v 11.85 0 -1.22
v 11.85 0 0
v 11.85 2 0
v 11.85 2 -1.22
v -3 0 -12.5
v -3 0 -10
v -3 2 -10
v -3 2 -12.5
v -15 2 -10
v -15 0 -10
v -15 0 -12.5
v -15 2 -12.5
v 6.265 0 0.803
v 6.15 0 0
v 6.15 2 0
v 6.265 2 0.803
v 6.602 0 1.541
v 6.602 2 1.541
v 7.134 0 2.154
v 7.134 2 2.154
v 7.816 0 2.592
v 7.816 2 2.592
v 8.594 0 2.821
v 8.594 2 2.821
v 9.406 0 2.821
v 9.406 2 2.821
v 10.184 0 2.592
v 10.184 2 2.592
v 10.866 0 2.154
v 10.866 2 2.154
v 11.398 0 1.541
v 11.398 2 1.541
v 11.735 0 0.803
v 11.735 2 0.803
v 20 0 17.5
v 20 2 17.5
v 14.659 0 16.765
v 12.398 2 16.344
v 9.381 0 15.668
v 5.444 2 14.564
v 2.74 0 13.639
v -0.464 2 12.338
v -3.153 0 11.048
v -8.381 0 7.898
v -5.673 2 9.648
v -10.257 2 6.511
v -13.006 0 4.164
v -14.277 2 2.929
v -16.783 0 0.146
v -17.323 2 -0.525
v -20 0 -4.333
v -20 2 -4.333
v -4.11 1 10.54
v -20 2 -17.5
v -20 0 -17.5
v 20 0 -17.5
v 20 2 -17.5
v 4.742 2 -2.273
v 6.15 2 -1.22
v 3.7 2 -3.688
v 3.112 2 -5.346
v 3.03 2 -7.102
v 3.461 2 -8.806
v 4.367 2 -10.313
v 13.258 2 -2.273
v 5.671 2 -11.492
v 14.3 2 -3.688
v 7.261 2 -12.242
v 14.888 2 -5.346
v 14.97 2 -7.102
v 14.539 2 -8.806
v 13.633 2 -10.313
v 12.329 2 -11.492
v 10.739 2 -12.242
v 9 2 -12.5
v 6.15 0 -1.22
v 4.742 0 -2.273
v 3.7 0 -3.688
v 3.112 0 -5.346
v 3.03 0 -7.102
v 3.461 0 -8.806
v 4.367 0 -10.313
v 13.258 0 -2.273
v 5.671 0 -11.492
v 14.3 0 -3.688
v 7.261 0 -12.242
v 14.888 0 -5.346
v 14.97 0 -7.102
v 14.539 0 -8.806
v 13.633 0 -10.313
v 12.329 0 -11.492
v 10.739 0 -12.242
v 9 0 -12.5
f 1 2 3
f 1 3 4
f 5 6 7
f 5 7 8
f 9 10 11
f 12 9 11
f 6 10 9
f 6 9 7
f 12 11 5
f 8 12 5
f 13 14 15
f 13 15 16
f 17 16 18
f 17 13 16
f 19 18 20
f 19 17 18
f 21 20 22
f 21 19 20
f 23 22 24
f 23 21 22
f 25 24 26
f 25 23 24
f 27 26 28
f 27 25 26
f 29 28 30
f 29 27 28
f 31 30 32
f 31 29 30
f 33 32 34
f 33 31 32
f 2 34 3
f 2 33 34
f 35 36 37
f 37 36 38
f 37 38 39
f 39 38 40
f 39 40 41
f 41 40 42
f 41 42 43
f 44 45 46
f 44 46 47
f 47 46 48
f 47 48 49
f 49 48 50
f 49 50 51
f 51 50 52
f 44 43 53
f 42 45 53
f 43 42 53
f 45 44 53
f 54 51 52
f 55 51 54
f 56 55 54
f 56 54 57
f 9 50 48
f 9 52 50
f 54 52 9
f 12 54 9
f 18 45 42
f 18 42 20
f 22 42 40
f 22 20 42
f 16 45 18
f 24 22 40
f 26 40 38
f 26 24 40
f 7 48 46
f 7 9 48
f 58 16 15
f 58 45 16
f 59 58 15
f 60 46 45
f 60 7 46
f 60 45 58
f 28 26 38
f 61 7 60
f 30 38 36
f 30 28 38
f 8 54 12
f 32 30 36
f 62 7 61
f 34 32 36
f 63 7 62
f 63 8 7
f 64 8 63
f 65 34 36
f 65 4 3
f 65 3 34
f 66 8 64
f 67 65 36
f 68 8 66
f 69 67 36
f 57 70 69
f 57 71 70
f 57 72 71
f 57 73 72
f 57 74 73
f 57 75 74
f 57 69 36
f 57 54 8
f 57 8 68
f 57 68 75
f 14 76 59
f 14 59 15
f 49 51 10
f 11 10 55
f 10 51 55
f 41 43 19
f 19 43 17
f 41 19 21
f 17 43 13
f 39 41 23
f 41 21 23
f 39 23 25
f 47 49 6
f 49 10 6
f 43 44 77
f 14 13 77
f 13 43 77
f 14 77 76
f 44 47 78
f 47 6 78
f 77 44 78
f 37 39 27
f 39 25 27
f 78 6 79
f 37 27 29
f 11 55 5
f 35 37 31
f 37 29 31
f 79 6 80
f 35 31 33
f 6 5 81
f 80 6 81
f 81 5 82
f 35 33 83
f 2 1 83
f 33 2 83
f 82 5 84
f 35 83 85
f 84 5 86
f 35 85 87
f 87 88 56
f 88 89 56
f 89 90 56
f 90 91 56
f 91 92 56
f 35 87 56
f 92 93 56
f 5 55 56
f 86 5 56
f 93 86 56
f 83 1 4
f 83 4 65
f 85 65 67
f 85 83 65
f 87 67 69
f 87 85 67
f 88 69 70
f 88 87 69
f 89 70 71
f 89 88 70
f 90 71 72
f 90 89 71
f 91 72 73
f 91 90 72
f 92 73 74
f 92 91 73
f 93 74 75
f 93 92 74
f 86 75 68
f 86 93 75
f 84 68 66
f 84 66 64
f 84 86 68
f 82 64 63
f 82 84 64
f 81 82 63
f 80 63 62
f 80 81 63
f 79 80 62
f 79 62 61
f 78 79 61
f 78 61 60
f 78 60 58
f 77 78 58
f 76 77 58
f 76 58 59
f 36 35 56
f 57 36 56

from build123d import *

# Parameters (mm, degrees)
ESQUISSE1_W             = 40
ESQUISSE1_H             = 35
ESQUISSE1_W_2           = 12
ESQUISSE1_H_2           = 2.5
BOSS_EXTRU_1_DEPTH      = 2
ENL_V_MAT_EXTRU_1_DEPTH = 10


with BuildPart() as part:
    # Esquisse1 → Boss.-Extru.1 (new body)
    with BuildSketch(Plane(origin=(0, 0, 0), x_dir=(1, 0, 0), z_dir=(0, 1, 0))):
        Rectangle(ESQUISSE1_W, ESQUISSE1_H)
        with BuildLine():
            Line((6.15, 1.220085228), (6.15, 0))
            ThreePointArc((6.15, 0), (9, -2.85), (11.85, 0))
            Line((11.85, 0), (11.85, 1.220085228))
            ThreePointArc((11.85, 1.220085228), (9, 12.5), (6.15, 1.220085228))
        make_face(mode=Mode.SUBTRACT)
        with Locations((-9, 11.25)):
            Rectangle(ESQUISSE1_W_2, ESQUISSE1_H_2, mode=Mode.SUBTRACT)
    extrude(amount=BOSS_EXTRU_1_DEPTH)

    # Esquisse2 → Enlèv. mat.-Extru.1 (cut)
    with BuildSketch(Plane(origin=(0, 2, 0), x_dir=(1, 0, 0), z_dir=(0, 1, 0))):
        with BuildLine():
            Line((-24.036917244, 12.452787924), (-23.501994654, -22.917521082))
            Line((-23.501994654, -22.917521082), (20, -17.5))
            add(Edge.make_bspline(
                [(20, -17.5), (-13.836799154, -13.898150417), (-24.036917244, 12.452787924)],
                knots=[0, 0, 0, 1, 1, 1], degree=2))
        make_face()
    extrude(amount=-ENL_V_MAT_EXTRU_1_DEPTH, mode=Mode.SUBTRACT)


solid = part.part
